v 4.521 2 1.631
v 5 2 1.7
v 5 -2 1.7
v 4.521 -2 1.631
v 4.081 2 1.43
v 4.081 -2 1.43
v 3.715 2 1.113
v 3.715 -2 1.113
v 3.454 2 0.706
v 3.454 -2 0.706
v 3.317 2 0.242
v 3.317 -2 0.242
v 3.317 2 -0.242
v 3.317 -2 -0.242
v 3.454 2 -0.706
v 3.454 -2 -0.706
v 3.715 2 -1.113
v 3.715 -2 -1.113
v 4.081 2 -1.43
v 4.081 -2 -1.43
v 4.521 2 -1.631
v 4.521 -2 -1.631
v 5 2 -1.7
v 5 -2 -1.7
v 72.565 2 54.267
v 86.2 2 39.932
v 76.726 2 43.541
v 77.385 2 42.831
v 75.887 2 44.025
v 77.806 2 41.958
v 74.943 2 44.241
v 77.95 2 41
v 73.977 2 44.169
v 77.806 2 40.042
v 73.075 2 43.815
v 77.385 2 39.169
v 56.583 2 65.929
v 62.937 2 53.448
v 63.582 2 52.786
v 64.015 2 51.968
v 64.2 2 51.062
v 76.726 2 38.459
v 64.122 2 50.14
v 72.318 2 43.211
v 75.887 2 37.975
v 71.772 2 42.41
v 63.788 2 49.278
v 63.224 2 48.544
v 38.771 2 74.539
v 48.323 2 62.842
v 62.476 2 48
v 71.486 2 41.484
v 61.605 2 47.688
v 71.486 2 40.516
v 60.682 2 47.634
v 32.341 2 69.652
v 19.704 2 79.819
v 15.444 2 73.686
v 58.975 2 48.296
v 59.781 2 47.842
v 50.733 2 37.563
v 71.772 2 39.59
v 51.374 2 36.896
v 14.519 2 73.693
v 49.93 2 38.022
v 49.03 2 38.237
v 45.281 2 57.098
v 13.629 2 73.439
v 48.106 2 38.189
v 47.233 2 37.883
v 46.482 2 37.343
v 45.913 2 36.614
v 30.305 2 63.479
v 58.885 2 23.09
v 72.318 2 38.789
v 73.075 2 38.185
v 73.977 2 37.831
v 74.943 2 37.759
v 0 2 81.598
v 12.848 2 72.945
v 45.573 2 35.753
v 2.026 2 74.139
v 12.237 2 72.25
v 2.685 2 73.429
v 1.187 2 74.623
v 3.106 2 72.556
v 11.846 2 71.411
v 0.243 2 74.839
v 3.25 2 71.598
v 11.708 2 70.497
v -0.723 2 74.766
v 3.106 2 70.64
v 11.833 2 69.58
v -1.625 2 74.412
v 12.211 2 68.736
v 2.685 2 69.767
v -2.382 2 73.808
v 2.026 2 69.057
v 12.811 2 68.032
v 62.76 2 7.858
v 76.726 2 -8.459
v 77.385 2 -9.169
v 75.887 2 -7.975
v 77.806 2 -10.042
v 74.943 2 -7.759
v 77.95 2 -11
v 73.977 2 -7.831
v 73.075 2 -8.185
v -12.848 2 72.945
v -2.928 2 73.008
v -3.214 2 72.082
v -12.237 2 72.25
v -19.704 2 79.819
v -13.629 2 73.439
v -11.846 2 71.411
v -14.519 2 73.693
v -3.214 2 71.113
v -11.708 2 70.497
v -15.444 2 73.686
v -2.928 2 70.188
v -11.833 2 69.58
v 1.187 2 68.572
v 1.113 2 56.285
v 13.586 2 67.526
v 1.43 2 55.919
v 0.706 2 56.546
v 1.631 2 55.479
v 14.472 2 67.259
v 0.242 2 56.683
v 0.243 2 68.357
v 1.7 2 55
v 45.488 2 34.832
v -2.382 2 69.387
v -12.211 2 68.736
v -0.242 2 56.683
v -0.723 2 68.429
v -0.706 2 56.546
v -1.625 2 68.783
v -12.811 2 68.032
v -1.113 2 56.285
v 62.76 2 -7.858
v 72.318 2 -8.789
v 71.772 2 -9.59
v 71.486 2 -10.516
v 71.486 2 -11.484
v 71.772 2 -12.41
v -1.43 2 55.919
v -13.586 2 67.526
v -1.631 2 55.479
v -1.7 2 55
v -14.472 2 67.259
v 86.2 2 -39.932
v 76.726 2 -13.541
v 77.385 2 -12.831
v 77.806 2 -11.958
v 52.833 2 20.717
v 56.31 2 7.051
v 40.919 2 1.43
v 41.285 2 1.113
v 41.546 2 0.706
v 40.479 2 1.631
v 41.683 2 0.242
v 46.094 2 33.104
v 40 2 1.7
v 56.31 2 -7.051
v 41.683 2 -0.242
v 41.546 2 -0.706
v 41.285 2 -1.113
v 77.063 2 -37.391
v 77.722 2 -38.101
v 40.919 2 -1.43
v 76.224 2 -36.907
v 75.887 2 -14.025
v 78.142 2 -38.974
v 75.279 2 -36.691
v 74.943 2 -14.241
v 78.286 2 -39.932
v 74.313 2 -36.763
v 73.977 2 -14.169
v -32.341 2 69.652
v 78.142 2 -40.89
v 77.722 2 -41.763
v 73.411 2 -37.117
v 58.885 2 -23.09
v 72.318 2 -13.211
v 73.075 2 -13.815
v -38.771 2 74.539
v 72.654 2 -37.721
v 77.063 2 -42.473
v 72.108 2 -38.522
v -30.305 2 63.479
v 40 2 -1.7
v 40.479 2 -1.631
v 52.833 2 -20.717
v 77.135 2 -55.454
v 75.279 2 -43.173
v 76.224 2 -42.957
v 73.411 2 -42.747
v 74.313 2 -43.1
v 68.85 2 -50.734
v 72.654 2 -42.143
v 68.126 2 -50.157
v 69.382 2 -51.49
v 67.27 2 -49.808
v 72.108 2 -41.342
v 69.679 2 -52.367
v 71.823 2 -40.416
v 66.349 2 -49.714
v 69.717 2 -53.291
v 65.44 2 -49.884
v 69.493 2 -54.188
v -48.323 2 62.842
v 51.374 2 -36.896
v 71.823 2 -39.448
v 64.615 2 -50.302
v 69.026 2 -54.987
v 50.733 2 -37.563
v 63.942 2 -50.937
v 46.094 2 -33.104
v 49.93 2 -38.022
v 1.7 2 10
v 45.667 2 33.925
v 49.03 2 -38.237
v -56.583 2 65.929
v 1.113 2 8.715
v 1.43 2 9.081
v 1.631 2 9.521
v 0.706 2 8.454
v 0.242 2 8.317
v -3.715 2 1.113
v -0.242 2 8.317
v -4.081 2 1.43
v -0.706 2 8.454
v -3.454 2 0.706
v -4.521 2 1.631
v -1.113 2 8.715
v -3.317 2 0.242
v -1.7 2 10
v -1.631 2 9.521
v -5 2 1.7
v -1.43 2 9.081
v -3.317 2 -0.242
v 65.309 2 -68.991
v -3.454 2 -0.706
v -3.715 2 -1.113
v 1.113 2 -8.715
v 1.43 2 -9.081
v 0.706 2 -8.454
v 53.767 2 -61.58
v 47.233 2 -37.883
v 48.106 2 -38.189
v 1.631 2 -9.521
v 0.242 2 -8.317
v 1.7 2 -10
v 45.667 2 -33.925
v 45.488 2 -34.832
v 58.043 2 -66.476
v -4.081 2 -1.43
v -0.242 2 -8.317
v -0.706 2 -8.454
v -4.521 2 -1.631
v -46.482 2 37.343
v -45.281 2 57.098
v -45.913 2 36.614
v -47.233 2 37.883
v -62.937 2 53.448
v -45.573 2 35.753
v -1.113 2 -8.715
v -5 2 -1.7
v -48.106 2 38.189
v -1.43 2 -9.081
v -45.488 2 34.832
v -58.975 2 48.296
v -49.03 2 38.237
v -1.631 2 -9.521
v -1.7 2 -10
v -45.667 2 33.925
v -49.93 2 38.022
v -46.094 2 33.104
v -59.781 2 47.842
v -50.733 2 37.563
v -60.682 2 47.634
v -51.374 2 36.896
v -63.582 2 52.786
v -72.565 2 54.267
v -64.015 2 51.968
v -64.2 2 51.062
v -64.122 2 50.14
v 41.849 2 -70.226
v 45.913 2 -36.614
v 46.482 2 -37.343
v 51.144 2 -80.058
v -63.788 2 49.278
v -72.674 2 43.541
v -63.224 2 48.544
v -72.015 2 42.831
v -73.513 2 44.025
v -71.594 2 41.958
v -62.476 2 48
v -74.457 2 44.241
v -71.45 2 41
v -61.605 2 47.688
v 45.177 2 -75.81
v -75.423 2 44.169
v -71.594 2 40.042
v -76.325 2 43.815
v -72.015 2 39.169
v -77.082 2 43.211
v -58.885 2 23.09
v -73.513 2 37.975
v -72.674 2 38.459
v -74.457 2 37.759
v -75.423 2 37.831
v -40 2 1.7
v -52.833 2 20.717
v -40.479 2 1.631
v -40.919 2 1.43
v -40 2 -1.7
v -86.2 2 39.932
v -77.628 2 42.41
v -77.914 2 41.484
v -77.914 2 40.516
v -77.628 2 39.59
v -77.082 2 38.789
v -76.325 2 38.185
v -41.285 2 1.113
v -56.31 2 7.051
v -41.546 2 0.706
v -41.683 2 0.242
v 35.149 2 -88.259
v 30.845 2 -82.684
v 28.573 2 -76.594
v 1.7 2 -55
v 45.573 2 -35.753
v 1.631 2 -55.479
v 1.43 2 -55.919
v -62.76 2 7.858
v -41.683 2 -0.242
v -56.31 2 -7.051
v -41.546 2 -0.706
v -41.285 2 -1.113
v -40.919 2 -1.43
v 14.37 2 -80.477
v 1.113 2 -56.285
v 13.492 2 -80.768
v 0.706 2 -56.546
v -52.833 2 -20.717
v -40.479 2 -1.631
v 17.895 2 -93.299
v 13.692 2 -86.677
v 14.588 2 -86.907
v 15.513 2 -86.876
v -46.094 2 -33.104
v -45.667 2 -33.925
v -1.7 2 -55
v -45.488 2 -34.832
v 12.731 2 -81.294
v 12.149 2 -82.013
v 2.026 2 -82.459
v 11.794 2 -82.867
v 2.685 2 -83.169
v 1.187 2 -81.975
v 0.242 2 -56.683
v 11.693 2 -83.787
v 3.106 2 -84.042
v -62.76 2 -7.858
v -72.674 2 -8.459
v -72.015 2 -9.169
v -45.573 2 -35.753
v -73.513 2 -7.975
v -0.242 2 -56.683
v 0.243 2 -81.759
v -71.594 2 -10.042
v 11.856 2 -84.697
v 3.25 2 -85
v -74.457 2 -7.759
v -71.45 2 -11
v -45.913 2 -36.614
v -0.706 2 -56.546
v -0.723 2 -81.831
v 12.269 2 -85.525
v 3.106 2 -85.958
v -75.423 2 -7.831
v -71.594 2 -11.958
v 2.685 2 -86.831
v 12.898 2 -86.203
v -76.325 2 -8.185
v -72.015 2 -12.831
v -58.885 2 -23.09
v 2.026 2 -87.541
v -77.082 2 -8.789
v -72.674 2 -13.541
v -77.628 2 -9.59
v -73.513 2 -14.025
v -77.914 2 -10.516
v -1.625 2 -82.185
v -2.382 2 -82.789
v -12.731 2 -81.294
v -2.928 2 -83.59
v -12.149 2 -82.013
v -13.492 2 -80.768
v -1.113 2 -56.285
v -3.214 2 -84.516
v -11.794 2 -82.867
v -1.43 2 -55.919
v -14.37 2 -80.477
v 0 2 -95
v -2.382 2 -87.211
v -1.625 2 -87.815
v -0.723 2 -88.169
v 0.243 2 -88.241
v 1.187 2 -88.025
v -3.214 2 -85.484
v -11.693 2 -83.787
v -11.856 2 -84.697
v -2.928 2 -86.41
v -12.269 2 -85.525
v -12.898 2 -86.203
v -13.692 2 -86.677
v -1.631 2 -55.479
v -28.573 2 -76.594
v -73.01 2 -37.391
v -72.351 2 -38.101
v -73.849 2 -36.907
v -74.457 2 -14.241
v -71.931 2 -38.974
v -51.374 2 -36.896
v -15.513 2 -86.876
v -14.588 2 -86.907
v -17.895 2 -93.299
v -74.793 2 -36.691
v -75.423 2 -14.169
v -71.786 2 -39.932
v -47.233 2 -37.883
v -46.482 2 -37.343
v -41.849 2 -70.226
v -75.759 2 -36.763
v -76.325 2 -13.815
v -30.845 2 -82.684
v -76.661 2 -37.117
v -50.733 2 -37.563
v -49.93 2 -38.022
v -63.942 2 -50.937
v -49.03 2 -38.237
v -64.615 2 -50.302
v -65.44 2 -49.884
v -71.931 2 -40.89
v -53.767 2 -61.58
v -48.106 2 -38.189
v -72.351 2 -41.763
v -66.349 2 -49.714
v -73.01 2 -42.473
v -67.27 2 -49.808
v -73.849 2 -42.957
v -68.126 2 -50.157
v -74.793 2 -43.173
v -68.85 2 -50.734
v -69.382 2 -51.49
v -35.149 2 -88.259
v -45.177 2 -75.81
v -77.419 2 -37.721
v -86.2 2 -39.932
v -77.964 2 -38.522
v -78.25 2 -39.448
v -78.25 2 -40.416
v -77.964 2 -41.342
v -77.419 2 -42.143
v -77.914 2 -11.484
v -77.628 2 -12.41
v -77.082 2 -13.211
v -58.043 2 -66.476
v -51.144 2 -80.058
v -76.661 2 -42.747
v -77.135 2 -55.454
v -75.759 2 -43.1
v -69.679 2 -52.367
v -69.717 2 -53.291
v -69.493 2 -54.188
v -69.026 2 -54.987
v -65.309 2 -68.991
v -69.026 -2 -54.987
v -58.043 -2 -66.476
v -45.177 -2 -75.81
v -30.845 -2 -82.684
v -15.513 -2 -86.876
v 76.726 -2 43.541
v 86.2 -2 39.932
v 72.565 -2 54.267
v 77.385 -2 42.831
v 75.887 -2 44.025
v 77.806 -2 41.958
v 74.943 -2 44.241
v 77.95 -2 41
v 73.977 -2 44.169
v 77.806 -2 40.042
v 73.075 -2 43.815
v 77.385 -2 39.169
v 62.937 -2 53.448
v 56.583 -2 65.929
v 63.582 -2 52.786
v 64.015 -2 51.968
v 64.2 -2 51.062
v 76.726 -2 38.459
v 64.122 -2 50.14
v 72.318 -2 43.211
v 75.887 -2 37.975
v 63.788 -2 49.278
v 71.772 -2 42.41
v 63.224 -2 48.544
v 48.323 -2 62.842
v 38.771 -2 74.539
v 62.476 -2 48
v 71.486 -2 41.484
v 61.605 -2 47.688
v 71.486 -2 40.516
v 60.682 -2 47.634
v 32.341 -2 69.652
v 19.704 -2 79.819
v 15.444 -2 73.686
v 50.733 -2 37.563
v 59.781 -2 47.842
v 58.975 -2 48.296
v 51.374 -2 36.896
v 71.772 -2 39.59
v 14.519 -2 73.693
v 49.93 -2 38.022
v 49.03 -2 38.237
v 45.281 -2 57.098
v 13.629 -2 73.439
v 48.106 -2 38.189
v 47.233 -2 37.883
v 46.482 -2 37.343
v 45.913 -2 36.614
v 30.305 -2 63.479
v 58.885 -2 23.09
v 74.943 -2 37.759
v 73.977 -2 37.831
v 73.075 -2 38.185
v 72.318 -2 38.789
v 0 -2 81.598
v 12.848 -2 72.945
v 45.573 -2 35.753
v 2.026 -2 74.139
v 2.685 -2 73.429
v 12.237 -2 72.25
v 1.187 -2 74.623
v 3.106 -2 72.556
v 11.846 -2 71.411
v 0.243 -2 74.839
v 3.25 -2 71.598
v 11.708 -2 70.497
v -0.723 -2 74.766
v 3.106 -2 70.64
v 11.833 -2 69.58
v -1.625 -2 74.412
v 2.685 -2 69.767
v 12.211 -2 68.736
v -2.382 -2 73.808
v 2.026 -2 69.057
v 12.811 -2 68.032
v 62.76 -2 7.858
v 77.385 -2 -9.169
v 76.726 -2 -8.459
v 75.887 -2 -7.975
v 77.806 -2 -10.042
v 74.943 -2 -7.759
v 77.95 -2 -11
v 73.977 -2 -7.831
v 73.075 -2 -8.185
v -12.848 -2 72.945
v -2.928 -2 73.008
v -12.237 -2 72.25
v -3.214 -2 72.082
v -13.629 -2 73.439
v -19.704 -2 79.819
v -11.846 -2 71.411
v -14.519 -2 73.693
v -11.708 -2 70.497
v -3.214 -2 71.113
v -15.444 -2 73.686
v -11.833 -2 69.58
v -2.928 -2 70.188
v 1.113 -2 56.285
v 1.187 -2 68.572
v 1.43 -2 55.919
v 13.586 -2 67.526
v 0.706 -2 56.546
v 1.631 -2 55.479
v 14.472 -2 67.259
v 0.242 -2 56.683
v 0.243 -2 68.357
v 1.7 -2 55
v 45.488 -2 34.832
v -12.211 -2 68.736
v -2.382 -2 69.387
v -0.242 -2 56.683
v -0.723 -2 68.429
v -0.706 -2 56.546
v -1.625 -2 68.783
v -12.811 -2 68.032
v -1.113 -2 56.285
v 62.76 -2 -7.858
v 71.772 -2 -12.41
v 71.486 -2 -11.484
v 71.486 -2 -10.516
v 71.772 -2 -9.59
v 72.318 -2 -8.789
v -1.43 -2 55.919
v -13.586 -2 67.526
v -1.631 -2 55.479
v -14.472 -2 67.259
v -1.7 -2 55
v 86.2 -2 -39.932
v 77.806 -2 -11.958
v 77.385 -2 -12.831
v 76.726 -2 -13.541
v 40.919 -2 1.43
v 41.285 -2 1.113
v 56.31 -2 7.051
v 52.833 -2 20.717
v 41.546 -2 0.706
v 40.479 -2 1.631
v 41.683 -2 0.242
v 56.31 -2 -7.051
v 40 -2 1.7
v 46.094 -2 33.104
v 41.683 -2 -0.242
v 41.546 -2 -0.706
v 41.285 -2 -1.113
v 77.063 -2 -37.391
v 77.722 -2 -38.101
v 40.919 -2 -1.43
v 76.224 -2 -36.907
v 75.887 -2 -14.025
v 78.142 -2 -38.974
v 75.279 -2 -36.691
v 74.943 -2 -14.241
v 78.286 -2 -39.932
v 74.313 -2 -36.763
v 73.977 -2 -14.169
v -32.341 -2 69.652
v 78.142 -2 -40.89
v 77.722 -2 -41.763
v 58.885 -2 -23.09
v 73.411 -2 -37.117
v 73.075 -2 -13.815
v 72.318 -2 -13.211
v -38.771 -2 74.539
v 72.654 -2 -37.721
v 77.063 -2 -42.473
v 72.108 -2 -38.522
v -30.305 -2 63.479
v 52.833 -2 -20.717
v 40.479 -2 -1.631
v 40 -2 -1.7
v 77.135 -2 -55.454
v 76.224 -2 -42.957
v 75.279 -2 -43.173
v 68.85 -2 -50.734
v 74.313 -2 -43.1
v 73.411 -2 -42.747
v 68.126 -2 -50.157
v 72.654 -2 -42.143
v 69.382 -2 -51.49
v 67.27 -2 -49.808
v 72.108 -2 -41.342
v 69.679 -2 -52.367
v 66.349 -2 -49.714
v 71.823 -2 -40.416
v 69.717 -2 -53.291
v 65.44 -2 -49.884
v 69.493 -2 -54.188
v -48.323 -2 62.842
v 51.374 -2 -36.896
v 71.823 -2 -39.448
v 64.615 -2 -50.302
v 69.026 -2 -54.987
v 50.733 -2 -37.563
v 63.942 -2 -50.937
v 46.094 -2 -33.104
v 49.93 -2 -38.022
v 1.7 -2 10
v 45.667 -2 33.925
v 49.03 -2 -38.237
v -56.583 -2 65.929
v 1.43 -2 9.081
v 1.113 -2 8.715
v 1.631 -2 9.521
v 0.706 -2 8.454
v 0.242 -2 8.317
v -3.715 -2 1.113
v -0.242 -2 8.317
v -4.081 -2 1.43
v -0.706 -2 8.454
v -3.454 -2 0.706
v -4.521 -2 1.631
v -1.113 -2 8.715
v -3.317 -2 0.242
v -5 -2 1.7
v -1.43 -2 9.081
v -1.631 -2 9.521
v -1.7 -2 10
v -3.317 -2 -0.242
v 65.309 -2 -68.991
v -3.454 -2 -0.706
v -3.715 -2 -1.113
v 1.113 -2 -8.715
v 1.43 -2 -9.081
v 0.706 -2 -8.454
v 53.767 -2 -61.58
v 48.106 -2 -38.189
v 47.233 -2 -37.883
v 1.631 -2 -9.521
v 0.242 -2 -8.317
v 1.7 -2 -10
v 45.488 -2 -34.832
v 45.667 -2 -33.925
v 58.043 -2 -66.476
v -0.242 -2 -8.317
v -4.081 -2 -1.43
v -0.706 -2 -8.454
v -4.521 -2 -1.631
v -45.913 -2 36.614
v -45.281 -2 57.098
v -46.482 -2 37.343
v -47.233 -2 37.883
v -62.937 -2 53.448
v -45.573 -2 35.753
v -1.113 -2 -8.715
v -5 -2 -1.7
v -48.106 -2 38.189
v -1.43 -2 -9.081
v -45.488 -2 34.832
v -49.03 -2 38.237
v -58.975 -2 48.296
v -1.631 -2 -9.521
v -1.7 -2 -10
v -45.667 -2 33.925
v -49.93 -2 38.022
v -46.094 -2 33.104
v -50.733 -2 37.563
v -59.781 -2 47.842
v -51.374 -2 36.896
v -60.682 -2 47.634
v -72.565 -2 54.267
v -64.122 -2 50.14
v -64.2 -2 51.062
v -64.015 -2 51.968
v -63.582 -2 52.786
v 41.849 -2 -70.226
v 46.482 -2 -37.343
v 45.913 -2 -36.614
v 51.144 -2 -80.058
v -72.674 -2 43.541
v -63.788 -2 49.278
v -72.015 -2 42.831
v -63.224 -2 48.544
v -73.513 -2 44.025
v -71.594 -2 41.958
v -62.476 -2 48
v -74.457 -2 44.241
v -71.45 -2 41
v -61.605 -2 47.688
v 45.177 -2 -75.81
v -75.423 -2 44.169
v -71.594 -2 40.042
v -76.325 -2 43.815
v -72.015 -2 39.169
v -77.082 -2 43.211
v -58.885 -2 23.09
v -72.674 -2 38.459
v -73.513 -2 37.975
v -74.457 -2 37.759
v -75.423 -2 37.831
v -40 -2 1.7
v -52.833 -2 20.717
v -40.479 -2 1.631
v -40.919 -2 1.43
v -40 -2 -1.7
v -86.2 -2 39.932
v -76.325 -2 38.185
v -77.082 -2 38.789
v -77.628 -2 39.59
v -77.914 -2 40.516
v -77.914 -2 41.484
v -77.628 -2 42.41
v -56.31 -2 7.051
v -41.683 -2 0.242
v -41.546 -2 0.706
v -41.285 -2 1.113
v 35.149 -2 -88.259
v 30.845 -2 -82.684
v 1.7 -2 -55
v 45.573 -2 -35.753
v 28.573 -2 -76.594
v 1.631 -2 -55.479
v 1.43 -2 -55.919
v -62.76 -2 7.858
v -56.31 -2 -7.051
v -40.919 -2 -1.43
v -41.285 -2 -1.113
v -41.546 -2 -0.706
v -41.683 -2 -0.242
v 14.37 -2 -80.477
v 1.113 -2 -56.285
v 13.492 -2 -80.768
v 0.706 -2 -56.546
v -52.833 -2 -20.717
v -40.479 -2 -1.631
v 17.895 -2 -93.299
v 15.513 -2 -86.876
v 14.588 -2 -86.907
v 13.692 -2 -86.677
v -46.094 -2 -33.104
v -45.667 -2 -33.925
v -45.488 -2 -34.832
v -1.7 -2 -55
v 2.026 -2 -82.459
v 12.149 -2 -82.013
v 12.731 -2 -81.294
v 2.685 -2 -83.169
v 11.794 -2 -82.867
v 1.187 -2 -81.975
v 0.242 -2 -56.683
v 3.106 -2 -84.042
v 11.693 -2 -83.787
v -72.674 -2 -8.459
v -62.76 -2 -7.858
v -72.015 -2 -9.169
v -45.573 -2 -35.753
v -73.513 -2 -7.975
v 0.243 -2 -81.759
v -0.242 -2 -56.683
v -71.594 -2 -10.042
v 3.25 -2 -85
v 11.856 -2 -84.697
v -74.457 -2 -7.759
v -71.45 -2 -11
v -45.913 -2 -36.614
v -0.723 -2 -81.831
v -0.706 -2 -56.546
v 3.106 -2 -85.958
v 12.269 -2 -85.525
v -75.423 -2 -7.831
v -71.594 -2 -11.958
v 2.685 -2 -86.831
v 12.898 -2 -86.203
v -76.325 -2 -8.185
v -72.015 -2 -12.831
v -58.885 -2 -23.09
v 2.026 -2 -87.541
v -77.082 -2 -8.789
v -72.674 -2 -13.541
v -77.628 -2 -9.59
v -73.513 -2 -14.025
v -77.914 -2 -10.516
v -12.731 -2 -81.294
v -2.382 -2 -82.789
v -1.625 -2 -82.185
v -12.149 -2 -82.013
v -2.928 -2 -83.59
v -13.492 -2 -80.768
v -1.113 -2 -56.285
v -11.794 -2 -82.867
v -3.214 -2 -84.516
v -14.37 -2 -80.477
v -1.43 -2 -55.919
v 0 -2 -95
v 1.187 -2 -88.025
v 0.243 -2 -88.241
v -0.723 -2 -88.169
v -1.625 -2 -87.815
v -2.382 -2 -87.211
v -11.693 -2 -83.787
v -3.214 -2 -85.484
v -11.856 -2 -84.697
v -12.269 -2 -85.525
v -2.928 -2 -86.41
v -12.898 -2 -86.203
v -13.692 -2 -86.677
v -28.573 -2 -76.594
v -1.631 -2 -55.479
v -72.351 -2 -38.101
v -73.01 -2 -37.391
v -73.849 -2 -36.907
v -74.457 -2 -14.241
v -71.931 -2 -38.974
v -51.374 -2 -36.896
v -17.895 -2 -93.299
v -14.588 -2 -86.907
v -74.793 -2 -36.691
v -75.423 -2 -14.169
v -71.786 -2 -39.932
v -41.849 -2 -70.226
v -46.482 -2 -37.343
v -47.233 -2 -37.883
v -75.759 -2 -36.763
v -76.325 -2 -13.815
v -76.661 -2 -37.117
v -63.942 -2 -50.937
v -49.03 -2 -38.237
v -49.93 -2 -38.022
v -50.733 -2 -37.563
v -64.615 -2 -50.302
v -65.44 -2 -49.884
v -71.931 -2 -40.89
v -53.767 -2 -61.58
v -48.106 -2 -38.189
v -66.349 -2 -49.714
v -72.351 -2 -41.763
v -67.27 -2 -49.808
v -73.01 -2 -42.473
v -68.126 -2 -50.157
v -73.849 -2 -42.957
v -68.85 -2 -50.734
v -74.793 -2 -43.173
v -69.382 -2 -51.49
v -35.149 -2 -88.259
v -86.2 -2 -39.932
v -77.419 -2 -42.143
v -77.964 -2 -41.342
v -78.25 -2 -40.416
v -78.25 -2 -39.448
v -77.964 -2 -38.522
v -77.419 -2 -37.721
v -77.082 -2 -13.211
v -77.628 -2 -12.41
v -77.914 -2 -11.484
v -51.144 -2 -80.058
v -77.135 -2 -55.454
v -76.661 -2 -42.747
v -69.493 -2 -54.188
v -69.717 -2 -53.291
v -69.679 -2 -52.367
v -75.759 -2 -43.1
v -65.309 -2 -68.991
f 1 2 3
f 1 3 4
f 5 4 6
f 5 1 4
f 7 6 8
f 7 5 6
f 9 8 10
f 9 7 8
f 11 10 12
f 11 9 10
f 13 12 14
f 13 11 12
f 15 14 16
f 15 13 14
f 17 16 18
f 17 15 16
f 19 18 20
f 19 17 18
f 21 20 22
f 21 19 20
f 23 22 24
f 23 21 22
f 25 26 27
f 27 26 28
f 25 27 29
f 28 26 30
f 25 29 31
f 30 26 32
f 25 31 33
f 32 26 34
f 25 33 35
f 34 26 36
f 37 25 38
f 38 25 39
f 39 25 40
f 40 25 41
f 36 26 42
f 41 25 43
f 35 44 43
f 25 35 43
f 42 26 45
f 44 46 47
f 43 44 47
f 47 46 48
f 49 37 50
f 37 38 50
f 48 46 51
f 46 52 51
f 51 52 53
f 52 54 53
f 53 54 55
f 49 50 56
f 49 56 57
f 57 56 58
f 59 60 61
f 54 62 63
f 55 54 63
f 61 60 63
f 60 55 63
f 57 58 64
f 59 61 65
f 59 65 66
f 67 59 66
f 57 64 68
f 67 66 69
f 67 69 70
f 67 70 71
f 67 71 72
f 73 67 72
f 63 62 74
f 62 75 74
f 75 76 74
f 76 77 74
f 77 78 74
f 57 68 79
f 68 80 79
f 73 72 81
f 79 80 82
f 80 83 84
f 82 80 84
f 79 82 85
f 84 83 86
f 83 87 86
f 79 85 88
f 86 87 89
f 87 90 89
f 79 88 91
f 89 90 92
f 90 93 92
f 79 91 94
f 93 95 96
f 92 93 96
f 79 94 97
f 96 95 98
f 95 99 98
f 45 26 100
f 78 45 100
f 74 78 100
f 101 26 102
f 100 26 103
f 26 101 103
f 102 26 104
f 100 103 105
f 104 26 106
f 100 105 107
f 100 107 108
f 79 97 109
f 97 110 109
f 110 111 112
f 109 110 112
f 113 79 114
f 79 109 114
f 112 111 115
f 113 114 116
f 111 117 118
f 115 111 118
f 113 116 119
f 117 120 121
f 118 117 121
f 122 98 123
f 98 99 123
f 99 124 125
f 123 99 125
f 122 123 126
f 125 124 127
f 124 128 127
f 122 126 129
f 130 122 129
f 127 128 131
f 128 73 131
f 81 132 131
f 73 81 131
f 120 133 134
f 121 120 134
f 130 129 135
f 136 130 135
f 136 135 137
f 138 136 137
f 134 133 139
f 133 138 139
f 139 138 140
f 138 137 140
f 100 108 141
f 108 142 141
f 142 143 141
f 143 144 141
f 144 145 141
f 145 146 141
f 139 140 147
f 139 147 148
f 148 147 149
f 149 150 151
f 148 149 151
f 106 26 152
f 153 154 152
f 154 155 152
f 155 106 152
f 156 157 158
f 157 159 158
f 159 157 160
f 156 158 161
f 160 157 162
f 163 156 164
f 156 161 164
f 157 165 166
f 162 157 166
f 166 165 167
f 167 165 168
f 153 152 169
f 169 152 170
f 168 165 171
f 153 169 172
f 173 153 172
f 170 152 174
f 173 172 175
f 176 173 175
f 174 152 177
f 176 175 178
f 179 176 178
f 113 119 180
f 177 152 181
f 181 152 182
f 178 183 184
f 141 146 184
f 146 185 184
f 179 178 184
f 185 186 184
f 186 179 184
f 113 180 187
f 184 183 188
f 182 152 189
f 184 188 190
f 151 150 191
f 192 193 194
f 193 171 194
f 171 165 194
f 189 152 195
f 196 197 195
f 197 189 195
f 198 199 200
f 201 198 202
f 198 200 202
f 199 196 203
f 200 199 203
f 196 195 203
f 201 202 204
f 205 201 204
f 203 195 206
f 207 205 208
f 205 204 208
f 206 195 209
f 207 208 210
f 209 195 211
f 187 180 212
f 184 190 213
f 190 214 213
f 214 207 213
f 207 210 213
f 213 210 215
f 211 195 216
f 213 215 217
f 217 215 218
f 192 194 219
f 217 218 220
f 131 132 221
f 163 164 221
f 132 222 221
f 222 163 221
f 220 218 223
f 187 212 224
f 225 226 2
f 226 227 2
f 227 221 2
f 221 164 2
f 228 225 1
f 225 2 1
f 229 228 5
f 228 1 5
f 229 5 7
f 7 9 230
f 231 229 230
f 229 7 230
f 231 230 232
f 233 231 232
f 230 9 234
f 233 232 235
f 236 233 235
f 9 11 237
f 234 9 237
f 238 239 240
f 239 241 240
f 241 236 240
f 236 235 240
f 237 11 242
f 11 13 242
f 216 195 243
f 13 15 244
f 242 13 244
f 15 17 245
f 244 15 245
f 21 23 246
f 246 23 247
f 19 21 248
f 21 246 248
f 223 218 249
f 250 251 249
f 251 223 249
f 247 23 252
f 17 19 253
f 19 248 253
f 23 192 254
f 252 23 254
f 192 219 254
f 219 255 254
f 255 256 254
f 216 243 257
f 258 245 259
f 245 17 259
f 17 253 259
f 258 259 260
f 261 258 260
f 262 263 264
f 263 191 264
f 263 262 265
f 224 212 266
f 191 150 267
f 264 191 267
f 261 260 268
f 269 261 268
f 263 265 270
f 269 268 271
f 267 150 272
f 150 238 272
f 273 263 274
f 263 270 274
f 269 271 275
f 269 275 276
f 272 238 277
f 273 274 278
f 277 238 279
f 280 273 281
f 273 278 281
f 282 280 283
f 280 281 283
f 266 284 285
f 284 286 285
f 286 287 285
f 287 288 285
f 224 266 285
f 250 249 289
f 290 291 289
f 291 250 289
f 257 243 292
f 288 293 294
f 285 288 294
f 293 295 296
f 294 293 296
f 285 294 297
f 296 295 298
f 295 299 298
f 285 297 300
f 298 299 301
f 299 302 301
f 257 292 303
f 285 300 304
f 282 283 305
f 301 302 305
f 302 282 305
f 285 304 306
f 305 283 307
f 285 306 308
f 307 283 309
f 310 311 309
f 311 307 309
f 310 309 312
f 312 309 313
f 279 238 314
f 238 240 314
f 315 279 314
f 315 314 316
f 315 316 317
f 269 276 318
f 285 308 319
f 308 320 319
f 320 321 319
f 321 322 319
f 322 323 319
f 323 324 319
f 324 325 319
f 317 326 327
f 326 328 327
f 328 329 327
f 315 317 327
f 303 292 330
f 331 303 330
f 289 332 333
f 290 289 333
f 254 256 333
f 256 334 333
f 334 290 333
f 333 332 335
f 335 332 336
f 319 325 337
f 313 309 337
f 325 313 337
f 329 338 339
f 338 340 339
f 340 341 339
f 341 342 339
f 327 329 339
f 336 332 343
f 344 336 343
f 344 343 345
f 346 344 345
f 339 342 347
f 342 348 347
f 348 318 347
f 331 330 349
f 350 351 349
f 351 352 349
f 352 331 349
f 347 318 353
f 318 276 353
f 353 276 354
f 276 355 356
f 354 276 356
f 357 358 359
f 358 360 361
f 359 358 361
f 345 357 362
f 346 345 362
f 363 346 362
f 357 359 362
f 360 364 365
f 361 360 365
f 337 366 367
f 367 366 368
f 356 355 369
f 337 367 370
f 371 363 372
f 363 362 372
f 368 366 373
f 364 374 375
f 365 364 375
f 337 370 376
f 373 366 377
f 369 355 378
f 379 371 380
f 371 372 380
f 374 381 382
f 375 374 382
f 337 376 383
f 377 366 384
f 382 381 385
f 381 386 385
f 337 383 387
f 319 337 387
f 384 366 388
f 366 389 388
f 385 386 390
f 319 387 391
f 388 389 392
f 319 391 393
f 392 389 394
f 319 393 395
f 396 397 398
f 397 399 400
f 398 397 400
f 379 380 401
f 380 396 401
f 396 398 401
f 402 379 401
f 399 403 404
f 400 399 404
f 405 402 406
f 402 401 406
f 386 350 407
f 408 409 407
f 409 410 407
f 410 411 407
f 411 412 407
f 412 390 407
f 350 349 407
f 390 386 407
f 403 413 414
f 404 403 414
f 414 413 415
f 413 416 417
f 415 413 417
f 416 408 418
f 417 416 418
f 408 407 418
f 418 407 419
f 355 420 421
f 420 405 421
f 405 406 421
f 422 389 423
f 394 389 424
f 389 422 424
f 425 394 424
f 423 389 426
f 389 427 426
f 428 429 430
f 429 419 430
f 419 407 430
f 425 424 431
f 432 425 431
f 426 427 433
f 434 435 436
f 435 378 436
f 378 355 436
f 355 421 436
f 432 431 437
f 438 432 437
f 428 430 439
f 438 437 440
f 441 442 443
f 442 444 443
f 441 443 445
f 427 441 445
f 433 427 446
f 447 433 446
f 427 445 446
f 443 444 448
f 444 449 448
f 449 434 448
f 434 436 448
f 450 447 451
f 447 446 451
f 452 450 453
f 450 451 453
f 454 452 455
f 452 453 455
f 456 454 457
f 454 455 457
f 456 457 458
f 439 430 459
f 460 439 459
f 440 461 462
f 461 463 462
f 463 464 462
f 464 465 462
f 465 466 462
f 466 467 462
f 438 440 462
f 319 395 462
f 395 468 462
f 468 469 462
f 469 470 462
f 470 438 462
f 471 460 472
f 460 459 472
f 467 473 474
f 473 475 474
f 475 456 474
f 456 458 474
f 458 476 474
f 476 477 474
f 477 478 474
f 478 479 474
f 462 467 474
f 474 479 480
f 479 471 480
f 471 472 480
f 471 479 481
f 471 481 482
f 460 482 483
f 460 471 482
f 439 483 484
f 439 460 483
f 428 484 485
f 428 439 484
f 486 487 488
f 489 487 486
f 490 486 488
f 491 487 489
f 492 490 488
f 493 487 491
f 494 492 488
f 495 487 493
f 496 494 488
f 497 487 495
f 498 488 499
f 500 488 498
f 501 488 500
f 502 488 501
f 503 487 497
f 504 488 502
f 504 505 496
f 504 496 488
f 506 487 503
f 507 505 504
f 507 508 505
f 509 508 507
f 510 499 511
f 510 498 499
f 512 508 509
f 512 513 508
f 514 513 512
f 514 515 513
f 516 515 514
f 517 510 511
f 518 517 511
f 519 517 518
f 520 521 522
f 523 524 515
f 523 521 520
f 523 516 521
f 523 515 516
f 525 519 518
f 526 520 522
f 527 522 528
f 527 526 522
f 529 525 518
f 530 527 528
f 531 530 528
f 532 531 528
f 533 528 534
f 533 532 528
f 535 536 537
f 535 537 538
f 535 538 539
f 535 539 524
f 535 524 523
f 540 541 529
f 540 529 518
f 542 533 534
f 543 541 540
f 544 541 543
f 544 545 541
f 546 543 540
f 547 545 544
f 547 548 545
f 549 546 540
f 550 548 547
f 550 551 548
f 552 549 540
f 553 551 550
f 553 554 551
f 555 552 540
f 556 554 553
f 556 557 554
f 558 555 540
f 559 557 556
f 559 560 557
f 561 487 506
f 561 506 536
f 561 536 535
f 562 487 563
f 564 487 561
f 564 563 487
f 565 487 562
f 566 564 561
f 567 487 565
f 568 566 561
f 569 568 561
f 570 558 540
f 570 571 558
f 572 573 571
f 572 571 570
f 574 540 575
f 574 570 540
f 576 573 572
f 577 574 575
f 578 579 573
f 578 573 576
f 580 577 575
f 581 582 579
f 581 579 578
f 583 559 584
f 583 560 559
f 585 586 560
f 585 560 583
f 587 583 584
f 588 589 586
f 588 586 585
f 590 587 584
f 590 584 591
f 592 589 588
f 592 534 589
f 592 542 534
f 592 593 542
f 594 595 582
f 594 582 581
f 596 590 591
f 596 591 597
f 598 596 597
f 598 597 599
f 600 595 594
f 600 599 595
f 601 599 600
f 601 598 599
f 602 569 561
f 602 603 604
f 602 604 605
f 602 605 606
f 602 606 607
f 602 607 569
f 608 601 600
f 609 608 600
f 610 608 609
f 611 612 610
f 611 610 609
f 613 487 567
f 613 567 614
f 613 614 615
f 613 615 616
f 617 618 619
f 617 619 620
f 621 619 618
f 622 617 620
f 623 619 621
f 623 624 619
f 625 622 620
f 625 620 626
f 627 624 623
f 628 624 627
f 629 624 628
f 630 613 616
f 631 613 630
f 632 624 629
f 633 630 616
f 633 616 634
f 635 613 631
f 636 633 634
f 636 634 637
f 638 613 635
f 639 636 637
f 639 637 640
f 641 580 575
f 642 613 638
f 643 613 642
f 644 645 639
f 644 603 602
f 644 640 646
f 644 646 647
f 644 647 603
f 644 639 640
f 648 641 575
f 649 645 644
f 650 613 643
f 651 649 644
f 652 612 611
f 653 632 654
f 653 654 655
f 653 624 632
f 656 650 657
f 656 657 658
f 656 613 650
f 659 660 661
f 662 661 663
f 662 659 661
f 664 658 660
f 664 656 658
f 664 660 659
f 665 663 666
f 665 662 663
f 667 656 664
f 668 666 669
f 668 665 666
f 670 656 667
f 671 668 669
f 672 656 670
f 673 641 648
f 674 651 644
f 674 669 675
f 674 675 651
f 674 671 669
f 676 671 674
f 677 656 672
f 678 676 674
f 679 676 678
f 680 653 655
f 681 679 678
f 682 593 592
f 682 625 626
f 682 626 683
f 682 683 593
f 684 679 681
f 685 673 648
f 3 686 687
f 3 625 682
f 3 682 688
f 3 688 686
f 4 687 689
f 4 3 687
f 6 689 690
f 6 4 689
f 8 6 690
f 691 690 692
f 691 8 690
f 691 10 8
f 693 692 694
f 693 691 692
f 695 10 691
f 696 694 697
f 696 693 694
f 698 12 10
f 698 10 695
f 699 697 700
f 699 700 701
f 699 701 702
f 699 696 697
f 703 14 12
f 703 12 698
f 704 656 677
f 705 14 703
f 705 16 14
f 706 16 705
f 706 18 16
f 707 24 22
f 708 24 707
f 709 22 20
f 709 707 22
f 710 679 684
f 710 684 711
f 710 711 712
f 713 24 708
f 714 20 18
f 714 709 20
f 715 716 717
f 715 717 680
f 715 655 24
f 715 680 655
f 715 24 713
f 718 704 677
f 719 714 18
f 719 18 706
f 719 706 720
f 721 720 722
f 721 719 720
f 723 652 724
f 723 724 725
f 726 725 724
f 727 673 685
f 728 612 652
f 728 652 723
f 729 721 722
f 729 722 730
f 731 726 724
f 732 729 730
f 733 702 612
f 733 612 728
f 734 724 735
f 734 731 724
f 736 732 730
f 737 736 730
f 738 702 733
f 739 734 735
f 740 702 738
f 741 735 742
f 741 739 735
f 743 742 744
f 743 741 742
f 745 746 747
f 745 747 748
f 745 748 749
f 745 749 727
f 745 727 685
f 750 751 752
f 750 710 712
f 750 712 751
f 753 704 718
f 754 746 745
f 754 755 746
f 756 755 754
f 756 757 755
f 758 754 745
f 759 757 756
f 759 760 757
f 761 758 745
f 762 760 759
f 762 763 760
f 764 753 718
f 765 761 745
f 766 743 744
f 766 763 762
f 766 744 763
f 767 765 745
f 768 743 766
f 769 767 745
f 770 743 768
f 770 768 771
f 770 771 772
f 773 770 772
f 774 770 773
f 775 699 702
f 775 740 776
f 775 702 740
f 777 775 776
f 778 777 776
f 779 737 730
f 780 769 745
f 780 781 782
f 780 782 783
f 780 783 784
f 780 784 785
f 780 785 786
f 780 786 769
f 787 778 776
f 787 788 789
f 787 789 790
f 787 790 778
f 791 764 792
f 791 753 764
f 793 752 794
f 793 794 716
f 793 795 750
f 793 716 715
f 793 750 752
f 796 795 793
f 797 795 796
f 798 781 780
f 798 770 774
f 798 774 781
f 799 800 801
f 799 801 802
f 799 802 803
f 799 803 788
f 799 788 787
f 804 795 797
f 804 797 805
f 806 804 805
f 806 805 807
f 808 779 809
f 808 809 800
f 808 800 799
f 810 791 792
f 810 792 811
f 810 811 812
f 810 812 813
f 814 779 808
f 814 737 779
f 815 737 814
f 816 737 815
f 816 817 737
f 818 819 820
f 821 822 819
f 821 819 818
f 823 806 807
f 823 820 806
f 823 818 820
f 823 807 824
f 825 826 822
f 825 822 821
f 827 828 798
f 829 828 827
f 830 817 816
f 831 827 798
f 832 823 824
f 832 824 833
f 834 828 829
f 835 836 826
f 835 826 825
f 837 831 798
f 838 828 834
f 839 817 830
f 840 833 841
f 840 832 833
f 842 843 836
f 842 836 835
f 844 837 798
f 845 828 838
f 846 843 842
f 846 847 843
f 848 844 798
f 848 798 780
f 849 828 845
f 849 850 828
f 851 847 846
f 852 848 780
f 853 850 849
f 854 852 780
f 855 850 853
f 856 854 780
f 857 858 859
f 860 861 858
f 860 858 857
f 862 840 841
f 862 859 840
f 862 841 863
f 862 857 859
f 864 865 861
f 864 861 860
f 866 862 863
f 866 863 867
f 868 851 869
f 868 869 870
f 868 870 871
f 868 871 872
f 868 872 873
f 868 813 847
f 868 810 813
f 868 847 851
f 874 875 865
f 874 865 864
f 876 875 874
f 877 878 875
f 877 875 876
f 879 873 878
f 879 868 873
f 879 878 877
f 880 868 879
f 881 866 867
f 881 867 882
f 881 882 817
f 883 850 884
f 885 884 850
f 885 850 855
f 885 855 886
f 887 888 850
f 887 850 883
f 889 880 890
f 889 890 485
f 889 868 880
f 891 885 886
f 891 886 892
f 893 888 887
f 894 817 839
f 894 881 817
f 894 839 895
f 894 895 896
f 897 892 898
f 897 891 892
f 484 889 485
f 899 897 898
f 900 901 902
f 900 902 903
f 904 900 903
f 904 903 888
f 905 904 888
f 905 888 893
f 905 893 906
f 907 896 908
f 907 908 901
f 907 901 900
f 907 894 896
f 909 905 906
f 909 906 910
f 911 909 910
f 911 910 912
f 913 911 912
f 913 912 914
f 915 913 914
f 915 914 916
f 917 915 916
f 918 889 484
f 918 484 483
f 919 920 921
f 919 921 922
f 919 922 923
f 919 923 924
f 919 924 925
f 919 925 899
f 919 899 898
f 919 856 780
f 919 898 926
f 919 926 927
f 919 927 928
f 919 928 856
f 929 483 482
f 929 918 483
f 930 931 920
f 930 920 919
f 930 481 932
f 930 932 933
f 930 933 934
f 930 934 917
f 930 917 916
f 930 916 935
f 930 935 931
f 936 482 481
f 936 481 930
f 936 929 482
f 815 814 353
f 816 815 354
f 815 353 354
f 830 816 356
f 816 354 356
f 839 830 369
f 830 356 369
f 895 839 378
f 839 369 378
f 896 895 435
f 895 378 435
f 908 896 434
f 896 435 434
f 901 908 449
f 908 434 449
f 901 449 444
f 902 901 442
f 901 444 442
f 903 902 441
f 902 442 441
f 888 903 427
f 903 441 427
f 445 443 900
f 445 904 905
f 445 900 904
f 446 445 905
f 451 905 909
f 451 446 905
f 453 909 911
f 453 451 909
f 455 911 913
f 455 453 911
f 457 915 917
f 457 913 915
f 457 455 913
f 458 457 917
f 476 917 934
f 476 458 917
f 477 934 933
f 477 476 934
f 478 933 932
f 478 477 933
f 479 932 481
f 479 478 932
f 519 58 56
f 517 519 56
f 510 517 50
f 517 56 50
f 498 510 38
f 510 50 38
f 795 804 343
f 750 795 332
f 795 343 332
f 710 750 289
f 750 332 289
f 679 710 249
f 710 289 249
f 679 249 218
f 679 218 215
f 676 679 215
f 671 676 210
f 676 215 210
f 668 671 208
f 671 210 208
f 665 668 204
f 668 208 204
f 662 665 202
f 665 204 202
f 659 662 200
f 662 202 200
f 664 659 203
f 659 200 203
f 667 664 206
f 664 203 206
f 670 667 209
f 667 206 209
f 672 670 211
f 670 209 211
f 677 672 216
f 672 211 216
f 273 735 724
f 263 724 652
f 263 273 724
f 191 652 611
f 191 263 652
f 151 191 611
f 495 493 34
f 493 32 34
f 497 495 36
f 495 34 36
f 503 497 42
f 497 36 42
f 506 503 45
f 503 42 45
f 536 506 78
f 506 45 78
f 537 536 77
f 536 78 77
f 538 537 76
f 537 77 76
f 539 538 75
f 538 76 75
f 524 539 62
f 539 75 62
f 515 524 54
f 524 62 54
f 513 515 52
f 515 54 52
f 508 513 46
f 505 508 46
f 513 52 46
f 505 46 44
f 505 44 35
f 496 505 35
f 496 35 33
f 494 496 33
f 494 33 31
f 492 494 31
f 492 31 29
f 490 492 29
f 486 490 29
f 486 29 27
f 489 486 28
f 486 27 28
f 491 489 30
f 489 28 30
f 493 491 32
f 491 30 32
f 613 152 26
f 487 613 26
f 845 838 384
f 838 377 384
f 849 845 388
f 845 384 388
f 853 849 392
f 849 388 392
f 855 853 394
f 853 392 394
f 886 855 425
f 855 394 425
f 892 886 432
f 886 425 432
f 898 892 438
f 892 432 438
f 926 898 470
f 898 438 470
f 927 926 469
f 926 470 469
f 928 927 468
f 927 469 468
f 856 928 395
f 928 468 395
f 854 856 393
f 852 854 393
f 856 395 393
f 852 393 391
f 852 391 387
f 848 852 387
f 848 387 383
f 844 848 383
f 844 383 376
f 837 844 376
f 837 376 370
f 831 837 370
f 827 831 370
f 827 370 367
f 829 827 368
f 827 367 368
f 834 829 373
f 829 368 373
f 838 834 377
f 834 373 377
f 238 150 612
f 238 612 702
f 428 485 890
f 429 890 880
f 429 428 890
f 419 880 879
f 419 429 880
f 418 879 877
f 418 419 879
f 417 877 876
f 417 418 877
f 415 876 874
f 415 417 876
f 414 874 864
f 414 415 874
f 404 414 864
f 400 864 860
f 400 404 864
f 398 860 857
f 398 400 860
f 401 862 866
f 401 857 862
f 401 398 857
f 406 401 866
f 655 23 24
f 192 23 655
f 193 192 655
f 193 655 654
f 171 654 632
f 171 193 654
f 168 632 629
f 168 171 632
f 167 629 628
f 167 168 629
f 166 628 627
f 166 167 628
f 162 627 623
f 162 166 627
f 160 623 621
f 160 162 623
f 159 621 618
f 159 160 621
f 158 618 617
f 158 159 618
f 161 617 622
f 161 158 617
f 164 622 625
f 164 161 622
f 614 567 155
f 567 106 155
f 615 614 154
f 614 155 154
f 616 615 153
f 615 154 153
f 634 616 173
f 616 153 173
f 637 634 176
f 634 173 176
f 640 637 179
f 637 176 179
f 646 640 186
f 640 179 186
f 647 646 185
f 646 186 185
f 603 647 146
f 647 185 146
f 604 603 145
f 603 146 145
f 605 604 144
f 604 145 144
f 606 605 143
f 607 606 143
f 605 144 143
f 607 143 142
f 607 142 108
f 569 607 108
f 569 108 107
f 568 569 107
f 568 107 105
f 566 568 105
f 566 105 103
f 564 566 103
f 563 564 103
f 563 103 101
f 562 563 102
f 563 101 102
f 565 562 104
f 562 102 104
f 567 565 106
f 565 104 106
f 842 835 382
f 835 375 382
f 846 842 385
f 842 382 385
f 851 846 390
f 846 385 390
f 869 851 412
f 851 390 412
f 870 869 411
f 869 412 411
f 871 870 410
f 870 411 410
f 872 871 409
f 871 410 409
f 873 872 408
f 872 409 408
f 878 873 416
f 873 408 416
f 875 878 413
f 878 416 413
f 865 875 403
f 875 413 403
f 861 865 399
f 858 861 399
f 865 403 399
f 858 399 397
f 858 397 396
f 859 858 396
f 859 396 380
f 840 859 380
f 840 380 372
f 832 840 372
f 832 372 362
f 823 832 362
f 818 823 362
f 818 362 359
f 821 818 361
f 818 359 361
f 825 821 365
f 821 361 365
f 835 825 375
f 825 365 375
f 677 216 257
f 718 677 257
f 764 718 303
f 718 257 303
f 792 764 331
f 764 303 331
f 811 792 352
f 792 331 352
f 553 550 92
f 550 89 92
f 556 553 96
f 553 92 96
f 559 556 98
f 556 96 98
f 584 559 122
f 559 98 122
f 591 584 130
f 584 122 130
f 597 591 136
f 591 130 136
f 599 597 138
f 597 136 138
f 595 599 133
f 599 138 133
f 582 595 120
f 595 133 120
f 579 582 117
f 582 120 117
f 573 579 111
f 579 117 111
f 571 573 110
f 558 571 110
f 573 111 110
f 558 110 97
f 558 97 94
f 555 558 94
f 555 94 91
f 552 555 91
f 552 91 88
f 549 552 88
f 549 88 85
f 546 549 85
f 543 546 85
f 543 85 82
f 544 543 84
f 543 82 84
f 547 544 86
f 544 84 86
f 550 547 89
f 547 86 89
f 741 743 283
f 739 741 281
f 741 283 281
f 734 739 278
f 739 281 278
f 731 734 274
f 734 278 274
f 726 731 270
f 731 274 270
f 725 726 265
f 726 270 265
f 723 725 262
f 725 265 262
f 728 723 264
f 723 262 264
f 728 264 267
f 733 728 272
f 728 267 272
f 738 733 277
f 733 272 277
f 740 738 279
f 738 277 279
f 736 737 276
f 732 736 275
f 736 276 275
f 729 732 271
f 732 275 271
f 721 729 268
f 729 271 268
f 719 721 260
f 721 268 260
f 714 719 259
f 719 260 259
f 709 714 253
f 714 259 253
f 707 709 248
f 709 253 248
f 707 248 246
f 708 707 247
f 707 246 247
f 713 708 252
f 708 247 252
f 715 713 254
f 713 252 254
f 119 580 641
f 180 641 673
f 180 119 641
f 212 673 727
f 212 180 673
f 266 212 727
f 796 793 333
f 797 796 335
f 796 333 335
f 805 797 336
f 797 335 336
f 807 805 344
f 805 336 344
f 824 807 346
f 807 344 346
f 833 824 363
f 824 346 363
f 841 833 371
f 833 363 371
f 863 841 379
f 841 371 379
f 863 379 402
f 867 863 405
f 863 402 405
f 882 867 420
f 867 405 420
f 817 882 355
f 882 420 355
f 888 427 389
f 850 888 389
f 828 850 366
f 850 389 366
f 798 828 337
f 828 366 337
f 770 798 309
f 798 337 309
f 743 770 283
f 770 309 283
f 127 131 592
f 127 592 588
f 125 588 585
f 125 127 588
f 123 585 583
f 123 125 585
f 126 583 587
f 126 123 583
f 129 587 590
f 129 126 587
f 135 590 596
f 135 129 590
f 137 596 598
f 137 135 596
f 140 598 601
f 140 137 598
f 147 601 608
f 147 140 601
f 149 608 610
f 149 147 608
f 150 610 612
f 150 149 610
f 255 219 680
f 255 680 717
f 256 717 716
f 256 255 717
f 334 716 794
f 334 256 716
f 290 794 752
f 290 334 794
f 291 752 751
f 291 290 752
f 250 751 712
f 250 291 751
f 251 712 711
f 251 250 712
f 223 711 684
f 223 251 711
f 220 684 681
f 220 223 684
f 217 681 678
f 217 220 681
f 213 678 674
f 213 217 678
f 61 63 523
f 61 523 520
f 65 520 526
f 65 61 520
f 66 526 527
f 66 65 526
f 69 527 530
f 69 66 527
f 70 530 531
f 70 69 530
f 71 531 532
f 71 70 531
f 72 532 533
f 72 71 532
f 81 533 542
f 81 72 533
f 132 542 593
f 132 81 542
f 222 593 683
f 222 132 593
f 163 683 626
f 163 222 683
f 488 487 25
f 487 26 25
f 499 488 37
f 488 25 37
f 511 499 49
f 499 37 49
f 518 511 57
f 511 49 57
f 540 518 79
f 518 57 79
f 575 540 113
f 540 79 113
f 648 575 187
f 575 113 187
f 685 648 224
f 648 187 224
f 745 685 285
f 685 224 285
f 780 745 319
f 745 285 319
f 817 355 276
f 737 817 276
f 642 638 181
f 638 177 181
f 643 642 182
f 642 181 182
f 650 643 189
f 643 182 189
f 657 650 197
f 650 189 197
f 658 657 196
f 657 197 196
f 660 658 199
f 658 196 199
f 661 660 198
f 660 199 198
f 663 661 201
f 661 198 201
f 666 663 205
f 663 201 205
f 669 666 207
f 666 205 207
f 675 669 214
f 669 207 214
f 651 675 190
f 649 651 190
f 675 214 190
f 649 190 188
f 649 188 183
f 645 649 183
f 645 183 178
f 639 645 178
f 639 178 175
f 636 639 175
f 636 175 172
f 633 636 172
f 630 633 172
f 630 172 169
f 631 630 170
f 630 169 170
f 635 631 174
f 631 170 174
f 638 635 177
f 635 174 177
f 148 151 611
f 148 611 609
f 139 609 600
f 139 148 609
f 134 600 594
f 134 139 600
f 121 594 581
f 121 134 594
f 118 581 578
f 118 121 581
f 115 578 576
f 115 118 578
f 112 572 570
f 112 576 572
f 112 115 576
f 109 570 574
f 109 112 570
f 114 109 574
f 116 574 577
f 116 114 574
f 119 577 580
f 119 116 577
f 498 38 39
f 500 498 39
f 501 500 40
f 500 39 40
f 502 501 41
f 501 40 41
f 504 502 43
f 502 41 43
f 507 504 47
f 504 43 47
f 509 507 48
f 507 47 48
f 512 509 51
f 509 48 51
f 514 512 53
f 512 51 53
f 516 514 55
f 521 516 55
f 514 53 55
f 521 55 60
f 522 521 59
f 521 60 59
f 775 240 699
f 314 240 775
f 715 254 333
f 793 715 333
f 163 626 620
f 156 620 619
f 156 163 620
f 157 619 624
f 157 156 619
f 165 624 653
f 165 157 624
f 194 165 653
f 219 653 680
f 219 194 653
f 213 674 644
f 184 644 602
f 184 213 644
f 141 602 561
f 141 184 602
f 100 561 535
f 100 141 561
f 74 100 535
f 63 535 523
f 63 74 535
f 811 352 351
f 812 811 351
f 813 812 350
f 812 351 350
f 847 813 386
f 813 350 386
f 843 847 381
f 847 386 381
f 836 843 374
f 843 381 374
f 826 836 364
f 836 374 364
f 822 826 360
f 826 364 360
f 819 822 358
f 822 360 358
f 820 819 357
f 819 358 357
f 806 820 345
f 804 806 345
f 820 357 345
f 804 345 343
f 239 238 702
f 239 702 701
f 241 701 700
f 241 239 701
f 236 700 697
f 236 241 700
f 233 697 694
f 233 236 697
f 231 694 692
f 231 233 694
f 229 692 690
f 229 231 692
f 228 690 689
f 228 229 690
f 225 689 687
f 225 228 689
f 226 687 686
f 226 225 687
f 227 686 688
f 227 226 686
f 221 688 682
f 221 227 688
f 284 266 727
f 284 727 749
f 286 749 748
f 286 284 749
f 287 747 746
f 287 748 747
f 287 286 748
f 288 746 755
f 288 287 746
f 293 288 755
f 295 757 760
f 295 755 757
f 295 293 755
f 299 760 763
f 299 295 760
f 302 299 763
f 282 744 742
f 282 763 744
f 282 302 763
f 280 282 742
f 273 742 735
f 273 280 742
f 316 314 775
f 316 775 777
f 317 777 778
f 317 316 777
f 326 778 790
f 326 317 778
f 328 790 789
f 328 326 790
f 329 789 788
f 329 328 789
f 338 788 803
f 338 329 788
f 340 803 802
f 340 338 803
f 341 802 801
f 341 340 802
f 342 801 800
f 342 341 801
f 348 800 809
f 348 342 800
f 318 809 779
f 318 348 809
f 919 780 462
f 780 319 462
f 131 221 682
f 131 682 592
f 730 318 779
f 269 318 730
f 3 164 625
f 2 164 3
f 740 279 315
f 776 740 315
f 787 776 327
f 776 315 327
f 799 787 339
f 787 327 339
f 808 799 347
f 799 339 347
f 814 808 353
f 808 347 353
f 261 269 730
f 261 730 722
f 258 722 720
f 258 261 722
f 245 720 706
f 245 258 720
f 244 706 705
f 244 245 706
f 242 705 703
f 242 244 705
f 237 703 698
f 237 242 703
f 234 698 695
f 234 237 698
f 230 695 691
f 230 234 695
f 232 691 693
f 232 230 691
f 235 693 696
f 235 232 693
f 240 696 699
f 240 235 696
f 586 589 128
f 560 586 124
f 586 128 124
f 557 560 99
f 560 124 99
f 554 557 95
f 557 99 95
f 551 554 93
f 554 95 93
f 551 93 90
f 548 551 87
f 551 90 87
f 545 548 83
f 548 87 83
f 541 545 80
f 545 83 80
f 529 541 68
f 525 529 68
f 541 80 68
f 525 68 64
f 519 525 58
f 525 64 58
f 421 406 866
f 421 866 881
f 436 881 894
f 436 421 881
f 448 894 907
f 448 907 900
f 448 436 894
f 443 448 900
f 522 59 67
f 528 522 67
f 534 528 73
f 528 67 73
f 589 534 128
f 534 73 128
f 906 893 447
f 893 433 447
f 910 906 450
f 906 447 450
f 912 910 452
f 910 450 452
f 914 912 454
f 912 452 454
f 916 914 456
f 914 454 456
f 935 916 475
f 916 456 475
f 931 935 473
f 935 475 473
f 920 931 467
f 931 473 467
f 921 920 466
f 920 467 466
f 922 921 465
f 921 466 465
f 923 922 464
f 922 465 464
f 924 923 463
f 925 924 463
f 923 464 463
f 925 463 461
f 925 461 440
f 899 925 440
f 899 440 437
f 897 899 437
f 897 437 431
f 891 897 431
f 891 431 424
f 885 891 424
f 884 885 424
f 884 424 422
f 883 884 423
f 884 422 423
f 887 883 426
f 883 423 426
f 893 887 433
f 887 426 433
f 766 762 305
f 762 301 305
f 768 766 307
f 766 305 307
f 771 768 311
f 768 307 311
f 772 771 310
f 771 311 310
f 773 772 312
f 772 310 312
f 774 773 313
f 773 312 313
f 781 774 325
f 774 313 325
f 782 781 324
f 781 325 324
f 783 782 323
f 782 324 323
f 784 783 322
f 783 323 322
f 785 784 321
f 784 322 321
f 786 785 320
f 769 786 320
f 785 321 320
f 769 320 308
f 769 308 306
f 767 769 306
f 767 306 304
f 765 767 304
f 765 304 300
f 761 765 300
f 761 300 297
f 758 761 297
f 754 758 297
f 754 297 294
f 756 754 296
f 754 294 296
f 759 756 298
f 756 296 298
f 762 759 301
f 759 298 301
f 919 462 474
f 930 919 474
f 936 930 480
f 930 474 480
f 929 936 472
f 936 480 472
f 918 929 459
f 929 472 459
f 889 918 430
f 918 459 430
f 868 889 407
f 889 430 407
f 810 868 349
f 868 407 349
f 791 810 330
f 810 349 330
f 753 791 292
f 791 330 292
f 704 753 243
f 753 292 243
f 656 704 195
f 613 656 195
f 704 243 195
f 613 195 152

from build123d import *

# Parameters (mm, degrees)
BOSS_EXTRUDE1_DEPTH     = 2
SKETCH2_R               = 3.25
CUT_HOLES_DEPTH         = 3
CUT_HOLES_DEPTH_BACK    = 3
CUT_EXTRUDE1_DEPTH      = 3
CUT_EXTRUDE1_DEPTH_BACK = 3


with BuildPart() as part:
    # Sketch1 → Boss-Extrude1 (new body, symmetric)
    with BuildSketch(Plane(origin=(0, 0, 0), x_dir=(1, 0, 0), z_dir=(0, 1, 0))):
        with BuildLine():
            Line((86.2, 39.931942102), (86.2, -39.931942102))
            ThreePointArc((86.2, -39.931942102), (0, -81.597763245), (-86.2, -39.931942102))
            Line((-86.2, -39.931942102), (-86.2, 39.931942102))
            ThreePointArc((-86.2, 39.931942102), (0, 95), (86.2, 39.931942102))
        make_face()
    extrude(amount=BOSS_EXTRUDE1_DEPTH, both=True)

    # Sketch2 → Cut-Holes (cut, two sides)
    with BuildSketch(Plane(origin=(0, 0, 0), x_dir=(1, 0, 0), z_dir=(0, 1, 0))) as cut_holes_sk:
        with Locations((-74.7, 11)):
            Circle(SKETCH2_R)
        with Locations((-74.7, -41)):
            Circle(SKETCH2_R)
        with Locations((74.7, -41)):
            Circle(SKETCH2_R)
        with Locations((74.7, 11)):
            Circle(SKETCH2_R)
        with Locations((0, -71.597763245)):
            Circle(SKETCH2_R)
        with Locations((0, 85)):
            Circle(SKETCH2_R)
        with Locations((-75.036257902, 39.931942102)):
            Circle(SKETCH2_R)
        with Locations((75.036257902, 39.931942102)):
            Circle(SKETCH2_R)
        with BuildLine():
            ThreePointArc((14.471626034, -67.259325745), (11.744315506, -70.958890218), (15.443879979, -73.686200745))
            ThreePointArc((15.443879979, -73.686200745), (40.475581865, -66.58349782), (62.936747266, -53.448409812))
            ThreePointArc((62.936747266, -53.448409812), (63.532100029, -48.890937367), (58.974627584, -48.295584605))
            ThreePointArc((58.974627584, -48.295584605), (37.92748228, -60.603766345), (14.471626034, -67.259325745))
        make_face()
        with BuildLine():
            ThreePointArc((-62.936747266, -53.448409812), (-63.532100029, -48.890937367), (-58.974627584, -48.295584605))
            ThreePointArc((-58.974627584, -48.295584605), (-37.92748228, -60.603766345), (-14.471626034, -67.259325745))
            ThreePointArc((-14.471626034, -67.259325745), (-11.744315506, -70.958890218), (-15.443879979, -73.686200745))
            ThreePointArc((-15.443879979, -73.686200745), (-40.475581865, -66.58349782), (-62.936747266, -53.448409812))
        make_face()
        with BuildLine():
            ThreePointArc((-63.94162293, 50.936542452), (-68.508644796, 50.419520904), (-69.025666344, 54.98654277))
            ThreePointArc((-69.025666344, 54.98654277), (-45.1765399, 75.809911903), (-15.512787354, 86.875865052))
            ThreePointArc((-15.512787354, 86.875865052), (-11.742100438, 84.24776304), (-14.37020245, 80.477076125))
            ThreePointArc((-14.37020245, 80.477076125), (-41.849089369, 70.226179015), (-63.94162293, 50.936542452))
        make_face()
        with BuildLine():
            ThreePointArc((15.512787354, 86.875865052), (11.742100438, 84.24776304), (14.37020245, 80.477076125))
            ThreePointArc((14.37020245, 80.477076125), (41.849089369, 70.226179015), (63.94162293, 50.936542452))
            ThreePointArc((63.94162293, 50.936542452), (68.508644796, 50.419520904), (69.025666344, 54.98654277))
            ThreePointArc((69.025666344, 54.98654277), (45.1765399, 75.809911903), (15.512787354, 86.875865052))
        make_face()
    extrude(amount=CUT_HOLES_DEPTH, mode=Mode.SUBTRACT)
    extrude(cut_holes_sk.sketch, amount=-CUT_HOLES_DEPTH_BACK, mode=Mode.SUBTRACT)

    # Sketch3 → Cut-Extrude1 (cut, two sides)
    with BuildSketch(Plane(origin=(0, 0, 0), x_dir=(1, 0, 0), z_dir=(0, 1, 0))) as cut_extrude1_sk:
        with BuildLine():
            Line((5, 1.7), (40, 1.7))
            ThreePointArc((40, 1.7), (41.7, 0), (40, -1.7))
            Line((40, -1.7), (5, -1.7))
            ThreePointArc((5, -1.7), (3.3, 0), (5, 1.7))
        make_face()
        with BuildLine():
            Line((-5, -1.7), (-40, -1.7))
            ThreePointArc((-40, -1.7), (-41.7, 0), (-40, 1.7))
            Line((-40, 1.7), (-5, 1.7))
            ThreePointArc((-5, 1.7), (-3.3, 0), (-5, -1.7))
        make_face()
        with BuildLine():
            Line((-1.7, 55), (-1.7, 10))
            ThreePointArc((-1.7, 10), (0, 8.3), (1.7, 10))
            Line((1.7, 10), (1.7, 55))
            ThreePointArc((1.7, 55), (0, 56.7), (-1.7, 55))
        make_face()
        with BuildLine():
            Line((-1.7, -55), (-1.7, -10))
            ThreePointArc((-1.7, -10), (0, -8.3), (1.7, -10))
            Line((1.7, -10), (1.7, -55))
            ThreePointArc((1.7, -55), (0, -56.7), (-1.7, -55))
        make_face()
        with BuildLine():
            ThreePointArc((-46.094214922, 33.104166667), (-46.838138391, 37.639756802), (-51.373728526, 36.895833333))
            ThreePointArc((-51.373728526, 36.895833333), (-63.25, 0), (-51.373728526, -36.895833333))
            ThreePointArc((-51.373728526, -36.895833333), (-46.838138391, -37.639756802), (-46.094214922, -33.104166667))
            ThreePointArc((-46.094214922, -33.104166667), (-56.75, 0), (-46.094214922, 33.104166667))
        make_face()
        with BuildLine():
            ThreePointArc((51.373728526, -36.895833333), (46.838138391, -37.639756802), (46.094214922, -33.104166667))
            ThreePointArc((46.094214922, -33.104166667), (56.75, 0), (46.094214922, 33.104166667))
            ThreePointArc((46.094214922, 33.104166667), (46.838138391, 37.639756802), (51.373728526, 36.895833333))
            ThreePointArc((51.373728526, 36.895833333), (63.25, 0), (51.373728526, -36.895833333))
        make_face()
    extrude(amount=CUT_EXTRUDE1_DEPTH, mode=Mode.SUBTRACT)
    extrude(cut_extrude1_sk.sketch, amount=-CUT_EXTRUDE1_DEPTH_BACK, mode=Mode.SUBTRACT)


solid = part.part
